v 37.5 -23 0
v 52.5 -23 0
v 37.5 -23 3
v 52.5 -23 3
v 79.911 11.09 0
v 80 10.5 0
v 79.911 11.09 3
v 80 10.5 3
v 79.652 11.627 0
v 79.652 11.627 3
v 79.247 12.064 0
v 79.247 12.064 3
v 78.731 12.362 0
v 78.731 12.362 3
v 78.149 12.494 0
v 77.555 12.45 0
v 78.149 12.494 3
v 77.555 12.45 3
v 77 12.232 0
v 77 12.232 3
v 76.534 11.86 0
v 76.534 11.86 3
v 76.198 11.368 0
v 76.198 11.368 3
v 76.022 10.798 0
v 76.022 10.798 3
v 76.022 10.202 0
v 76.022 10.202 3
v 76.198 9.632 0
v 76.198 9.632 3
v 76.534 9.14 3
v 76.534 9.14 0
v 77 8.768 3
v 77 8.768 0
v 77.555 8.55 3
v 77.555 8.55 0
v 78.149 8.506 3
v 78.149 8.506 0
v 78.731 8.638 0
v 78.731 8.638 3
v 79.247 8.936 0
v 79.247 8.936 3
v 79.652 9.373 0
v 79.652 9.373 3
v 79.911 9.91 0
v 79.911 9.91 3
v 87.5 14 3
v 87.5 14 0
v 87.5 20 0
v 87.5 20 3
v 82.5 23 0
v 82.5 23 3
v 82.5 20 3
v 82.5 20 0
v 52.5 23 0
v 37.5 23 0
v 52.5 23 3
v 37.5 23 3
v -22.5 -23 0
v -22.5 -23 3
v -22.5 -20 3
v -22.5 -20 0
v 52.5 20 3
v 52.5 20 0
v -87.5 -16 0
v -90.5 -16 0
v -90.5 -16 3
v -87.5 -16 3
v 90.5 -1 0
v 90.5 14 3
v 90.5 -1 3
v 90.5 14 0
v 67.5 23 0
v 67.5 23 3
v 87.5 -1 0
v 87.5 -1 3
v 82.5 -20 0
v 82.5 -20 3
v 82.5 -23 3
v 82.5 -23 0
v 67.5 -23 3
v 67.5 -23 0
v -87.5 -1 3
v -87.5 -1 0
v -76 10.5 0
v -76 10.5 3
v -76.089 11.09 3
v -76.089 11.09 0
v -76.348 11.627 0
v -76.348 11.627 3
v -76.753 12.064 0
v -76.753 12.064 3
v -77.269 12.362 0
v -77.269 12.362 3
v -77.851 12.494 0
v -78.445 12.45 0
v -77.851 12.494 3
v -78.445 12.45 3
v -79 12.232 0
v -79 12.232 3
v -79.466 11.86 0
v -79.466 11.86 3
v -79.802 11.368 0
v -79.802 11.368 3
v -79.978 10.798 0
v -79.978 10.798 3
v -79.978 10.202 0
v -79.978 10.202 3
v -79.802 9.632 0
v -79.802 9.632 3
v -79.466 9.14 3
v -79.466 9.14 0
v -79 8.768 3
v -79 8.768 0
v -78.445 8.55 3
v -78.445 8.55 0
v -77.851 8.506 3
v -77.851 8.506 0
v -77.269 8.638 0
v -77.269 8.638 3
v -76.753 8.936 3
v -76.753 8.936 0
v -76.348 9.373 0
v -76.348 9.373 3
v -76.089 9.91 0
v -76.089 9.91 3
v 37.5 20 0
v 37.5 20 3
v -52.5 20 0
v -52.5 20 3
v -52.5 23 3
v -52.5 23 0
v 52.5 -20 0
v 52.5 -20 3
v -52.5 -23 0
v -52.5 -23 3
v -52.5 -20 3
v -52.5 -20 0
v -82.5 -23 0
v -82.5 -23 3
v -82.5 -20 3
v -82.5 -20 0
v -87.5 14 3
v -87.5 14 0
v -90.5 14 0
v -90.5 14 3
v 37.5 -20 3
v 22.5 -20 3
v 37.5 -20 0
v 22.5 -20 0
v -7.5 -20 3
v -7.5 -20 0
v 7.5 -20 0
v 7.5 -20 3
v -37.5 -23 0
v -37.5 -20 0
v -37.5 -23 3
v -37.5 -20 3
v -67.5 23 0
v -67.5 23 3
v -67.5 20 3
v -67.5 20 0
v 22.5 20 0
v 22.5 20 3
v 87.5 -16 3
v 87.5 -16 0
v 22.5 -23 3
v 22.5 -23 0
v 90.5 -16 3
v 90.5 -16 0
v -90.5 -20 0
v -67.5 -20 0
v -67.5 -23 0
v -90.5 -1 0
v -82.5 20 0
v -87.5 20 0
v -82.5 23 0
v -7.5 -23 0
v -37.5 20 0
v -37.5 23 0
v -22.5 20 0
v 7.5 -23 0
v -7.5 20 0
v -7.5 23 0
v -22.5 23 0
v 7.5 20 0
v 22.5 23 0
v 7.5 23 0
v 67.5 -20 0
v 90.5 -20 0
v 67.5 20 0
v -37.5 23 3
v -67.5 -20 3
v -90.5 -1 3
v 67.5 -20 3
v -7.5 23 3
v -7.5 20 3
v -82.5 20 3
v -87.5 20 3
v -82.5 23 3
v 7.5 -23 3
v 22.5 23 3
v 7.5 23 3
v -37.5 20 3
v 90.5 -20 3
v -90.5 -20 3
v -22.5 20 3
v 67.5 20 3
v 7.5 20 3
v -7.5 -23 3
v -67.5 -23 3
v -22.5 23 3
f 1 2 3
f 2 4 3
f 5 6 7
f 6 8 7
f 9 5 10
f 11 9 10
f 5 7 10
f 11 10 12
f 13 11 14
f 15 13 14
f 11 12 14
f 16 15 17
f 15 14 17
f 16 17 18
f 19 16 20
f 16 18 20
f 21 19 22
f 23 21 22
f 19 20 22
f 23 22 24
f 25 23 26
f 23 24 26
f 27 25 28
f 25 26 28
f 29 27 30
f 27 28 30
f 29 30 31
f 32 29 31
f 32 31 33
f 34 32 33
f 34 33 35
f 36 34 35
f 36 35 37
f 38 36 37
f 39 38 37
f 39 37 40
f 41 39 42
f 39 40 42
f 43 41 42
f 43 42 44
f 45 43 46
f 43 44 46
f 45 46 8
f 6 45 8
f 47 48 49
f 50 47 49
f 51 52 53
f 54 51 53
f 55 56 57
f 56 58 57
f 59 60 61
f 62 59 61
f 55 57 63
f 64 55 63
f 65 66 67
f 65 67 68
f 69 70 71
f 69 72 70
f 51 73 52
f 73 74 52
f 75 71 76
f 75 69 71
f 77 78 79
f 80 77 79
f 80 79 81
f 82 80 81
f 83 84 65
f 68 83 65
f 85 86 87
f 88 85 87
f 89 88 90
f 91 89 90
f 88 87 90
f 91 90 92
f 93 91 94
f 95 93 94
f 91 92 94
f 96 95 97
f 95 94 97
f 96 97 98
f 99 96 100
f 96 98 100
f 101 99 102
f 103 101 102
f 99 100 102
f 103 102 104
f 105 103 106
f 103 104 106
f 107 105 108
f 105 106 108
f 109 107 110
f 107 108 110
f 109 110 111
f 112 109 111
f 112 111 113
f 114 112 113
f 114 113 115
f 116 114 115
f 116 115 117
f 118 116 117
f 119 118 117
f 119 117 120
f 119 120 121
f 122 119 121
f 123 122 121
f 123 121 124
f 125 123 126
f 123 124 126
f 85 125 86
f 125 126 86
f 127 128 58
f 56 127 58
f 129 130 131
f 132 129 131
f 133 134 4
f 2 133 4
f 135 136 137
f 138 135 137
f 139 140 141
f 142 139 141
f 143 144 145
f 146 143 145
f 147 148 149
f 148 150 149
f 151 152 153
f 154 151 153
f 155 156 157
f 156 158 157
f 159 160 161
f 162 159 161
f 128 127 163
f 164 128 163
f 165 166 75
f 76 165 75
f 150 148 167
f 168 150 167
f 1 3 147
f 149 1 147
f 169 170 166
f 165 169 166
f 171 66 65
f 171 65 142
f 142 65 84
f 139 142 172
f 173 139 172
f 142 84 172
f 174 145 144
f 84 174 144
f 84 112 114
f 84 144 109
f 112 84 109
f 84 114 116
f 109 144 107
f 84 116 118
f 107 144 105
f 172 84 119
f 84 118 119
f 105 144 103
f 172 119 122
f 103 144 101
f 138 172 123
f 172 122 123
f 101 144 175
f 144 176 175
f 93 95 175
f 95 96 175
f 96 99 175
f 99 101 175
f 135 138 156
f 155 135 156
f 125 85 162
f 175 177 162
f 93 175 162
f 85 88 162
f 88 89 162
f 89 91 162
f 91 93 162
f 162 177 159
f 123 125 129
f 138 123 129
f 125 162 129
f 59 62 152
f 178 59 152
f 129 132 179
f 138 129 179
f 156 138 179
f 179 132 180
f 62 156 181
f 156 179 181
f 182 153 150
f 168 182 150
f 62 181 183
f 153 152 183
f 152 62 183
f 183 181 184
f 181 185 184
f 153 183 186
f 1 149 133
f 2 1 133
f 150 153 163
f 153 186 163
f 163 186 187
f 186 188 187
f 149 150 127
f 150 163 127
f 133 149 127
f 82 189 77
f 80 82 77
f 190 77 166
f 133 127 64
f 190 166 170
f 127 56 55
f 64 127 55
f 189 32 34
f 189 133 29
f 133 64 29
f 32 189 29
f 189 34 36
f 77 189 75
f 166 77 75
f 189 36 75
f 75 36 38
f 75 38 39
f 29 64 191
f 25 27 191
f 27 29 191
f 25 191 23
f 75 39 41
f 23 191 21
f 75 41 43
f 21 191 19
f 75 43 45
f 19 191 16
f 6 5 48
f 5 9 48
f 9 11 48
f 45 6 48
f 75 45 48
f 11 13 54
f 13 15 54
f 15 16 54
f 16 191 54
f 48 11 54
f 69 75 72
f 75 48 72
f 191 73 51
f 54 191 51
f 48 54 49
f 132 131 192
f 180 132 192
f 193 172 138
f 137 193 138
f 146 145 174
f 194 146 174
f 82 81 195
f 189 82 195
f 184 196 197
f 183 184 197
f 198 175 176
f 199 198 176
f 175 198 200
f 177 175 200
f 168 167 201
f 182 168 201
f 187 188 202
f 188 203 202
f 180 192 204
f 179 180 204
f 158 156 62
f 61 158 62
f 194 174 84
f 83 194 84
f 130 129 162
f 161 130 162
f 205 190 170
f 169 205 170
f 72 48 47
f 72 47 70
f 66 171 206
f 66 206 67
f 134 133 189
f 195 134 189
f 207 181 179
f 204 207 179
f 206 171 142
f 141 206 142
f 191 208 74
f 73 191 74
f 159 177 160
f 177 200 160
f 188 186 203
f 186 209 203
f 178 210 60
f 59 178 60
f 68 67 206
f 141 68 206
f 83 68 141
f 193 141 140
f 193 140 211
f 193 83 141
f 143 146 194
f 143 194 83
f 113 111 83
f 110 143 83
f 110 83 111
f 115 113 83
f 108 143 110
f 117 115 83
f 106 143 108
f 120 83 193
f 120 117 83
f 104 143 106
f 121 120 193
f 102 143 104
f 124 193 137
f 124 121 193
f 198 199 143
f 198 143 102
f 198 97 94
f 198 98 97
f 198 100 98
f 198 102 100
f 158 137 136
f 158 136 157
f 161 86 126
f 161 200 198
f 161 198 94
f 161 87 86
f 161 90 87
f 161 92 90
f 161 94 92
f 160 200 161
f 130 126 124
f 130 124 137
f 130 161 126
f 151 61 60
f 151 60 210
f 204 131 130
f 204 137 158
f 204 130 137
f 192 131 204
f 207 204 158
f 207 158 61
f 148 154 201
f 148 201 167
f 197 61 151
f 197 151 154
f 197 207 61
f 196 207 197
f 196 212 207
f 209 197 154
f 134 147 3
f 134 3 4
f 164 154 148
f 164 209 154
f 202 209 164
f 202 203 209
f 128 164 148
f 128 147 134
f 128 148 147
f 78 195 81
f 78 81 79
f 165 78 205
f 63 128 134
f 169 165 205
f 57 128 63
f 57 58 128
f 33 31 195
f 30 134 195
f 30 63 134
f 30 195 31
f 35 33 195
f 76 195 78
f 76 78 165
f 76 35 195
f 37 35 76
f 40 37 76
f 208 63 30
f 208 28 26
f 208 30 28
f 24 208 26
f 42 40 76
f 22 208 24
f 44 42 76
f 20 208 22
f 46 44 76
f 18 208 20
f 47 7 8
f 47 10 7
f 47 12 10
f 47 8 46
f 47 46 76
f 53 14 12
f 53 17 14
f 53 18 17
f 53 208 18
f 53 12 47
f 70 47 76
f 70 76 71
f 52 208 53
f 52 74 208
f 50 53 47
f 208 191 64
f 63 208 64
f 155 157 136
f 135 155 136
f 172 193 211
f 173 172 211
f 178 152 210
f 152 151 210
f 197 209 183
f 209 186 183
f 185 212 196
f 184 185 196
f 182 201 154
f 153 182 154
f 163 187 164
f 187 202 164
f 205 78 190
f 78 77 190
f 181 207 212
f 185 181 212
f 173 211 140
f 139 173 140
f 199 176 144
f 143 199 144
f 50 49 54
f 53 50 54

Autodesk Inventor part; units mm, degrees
ref_plane "YZ Plane" through (0, 0, 0) normal (1, 0, 0) x (0, 1, 0)
ref_plane "XZ Plane" through (0, 0, 0) normal (0, 1, 0) x (-1, 0, 0)
ref_plane "XY Plane" through (0, 0, 0) normal (0, 0, 1) x (1, 0, 0)
sketch "Sketch1" plane through (0, 0, 0) normal (0, 0, 1) x (1, 0, 0)
  line L0 (-87.5, -20) -> (87.5, -20)
  line L1 (87.5, -20) -> (87.5, 20)
  line L2 (87.5, 20) -> (-87.5, 20)
  line L3 (-87.5, 20) -> (-87.5, -20)
  line L4 (-87.5, -20) -> (87.5, 20) construction
  line L5 (87.5, -20) -> (-87.5, 20) construction
  line L6 (-87.5, 14) -> (-90.5, 14)
  line L7 (-90.5, 14) -> (-90.5, -1)
  line L8 (-90.5, -1) -> (-87.5, -1)
  line L9 (-87.5, -1) -> (-87.5, 14)
  line L10 (-87.5, -20) -> (-90.5, -20)
  line L11 (-90.5, -20) -> (-90.5, -16)
  line L12 (-90.5, -16) -> (-87.5, -16)
  line L13 (-87.5, -16) -> (-87.5, -20)
  line L14 (0, 20) -> (0, -20) construction
  line L15 (87.5, 14) -> (90.5, 14)
  line L16 (90.5, 14) -> (90.5, -1)
  line L17 (90.5, -1) -> (87.5, -1)
  line L18 (87.5, -1) -> (87.5, 14)
  line L19 (87.5, -20) -> (90.5, -20)
  line L20 (90.5, -20) -> (90.5, -16)
  line L21 (90.5, -16) -> (87.5, -16)
  line L22 (87.5, -16) -> (87.5, -20)
  point P0 (0, 0)
  dimension "d0" = 175
  dimension "d1" = 40
  dimension "d2" = 3
  dimension "d3" = 15
  dimension "d4" = 6
  dimension "d5" = 3
  dimension "d6" = 15
extrude "Extrusion1" add sketch "Sketch1" along normal blind 3
sketch "Sketch2" plane through (0, 0, 3) normal (0, 0, 1) x (1, 0, 0)
  line L0 (-90.5, -20) -> (90.5, -20)
  line L1 (-82.5, -20) -> (-67.5, -20)
  line L2 (-67.5, -20) -> (-67.5, -23)
  line L3 (-67.5, -23) -> (-82.5, -23)
  line L4 (-82.5, -23) -> (-82.5, -20)
  line L5 (-52.5, -20) -> (-37.5, -20)
  line L6 (-37.5, -20) -> (-37.5, -23)
  line L7 (-37.5, -23) -> (-52.5, -23)
  line L8 (-52.5, -23) -> (-52.5, -20)
  line L9 (-22.5, -20) -> (-7.5, -20)
  line L10 (-7.5, -20) -> (-7.5, -23)
  line L11 (-7.5, -23) -> (-22.5, -23)
  line L12 (-22.5, -23) -> (-22.5, -20)
  line L13 (7.5, -20) -> (22.5, -20)
  line L14 (22.5, -20) -> (22.5, -23)
  line L15 (22.5, -23) -> (7.5, -23)
  line L16 (7.5, -23) -> (7.5, -20)
  line L17 (37.5, -20) -> (52.5, -20)
  line L18 (52.5, -20) -> (52.5, -23)
  line L19 (52.5, -23) -> (37.5, -23)
  line L20 (37.5, -23) -> (37.5, -20)
  line L21 (67.5, -20) -> (82.5, -20)
  line L22 (82.5, -20) -> (82.5, -23)
  line L23 (82.5, -23) -> (67.5, -23)
  line L24 (67.5, -23) -> (67.5, -20)
  line L25 (-82.5, 23) -> (-67.5, 23)
  line L26 (-67.5, 23) -> (-67.5, 20)
  line L27 (-67.5, 20) -> (-82.5, 20)
  line L28 (-82.5, 20) -> (-82.5, 23)
  line L29 (-52.5, 23) -> (-37.5, 23)
  line L30 (-37.5, 23) -> (-37.5, 20)
  line L31 (-37.5, 20) -> (-52.5, 20)
  line L32 (-52.5, 20) -> (-52.5, 23)
  line L33 (-22.5, 23) -> (-7.5, 23)
  line L34 (-7.5, 23) -> (-7.5, 20)
  line L35 (-7.5, 20) -> (-22.5, 20)
  line L36 (-22.5, 20) -> (-22.5, 23)
  line L37 (7.5, 23) -> (22.5, 23)
  line L38 (22.5, 23) -> (22.5, 20)
  line L39 (22.5, 20) -> (7.5, 20)
  line L40 (7.5, 20) -> (7.5, 23)
  line L41 (37.5, 23) -> (52.5, 23)
  line L42 (52.5, 23) -> (52.5, 20)
  line L43 (52.5, 20) -> (37.5, 20)
  line L44 (37.5, 20) -> (37.5, 23)
  line L45 (67.5, 23) -> (82.5, 23)
  line L46 (82.5, 23) -> (82.5, 20)
  line L47 (82.5, 20) -> (67.5, 20)
  line L48 (67.5, 20) -> (67.5, 23)
  line L49 (-90.5, -16) -> (-90.5, -20) projected
  line L50 (-87.5, -16) -> (-90.5, -16) projected
  point P0 (0, 0)
  point P1 (0, 0)
  dimension "d13" = 15
  dimension "d14" = 3
  dimension "d16" = 30
  dimension "d17" = 43
  dimension "d18" = 8
  dimension "d19" = 4
extrude "Extrusion2" add sketch "Sketch2" against normal blind 3
sketch "Sketch3" plane through (0, 0, 3) normal (0, 0, 1) x (1, 0, 0)
  circle A0 centre (-78, 10.5) radius 2
  circle A1 centre (78, 10.5) radius 2
  line L0 (87.5, 14) -> (87.5, 20) projected
  line L1 (87.5, 20) -> (82.5, 20) projected
  line L2 (-52.5, 20) -> (-67.5, 20) projected
  line L3 (-87.5, 20) -> (-87.5, 14) projected
  point P0 (0, 0)
  dimension "d22" = 4
  dimension "d23" = 4
  dimension "d24" = 9.5
  dimension "d25" = 9.5
  dimension "d26" = 9.5
  dimension "d27" = 9.5
extrude "Extrusion3" cut sketch "Sketch3" against normal blind 10
equation "\"BendRadius\" = Thickness"
equation "\"BendReliefWidth\" = Thickness"
equation "\"BendReliefDepth\" = 0.5 * Thickness"
equation "\"CornerReliefSize\" = 4 * Thickness"
equation "\"MinimumRemnant\" = 2 * Thickness"
equation "\"TransitionRadius\" = BendRadius"
equation "\"JacobiRadiusSize\" = BendRadius"
equation "\"GapSize\" = Thickness"
equation "\"Thickness\" = 0.5"
properties part number "13 achter plaat LCD"
